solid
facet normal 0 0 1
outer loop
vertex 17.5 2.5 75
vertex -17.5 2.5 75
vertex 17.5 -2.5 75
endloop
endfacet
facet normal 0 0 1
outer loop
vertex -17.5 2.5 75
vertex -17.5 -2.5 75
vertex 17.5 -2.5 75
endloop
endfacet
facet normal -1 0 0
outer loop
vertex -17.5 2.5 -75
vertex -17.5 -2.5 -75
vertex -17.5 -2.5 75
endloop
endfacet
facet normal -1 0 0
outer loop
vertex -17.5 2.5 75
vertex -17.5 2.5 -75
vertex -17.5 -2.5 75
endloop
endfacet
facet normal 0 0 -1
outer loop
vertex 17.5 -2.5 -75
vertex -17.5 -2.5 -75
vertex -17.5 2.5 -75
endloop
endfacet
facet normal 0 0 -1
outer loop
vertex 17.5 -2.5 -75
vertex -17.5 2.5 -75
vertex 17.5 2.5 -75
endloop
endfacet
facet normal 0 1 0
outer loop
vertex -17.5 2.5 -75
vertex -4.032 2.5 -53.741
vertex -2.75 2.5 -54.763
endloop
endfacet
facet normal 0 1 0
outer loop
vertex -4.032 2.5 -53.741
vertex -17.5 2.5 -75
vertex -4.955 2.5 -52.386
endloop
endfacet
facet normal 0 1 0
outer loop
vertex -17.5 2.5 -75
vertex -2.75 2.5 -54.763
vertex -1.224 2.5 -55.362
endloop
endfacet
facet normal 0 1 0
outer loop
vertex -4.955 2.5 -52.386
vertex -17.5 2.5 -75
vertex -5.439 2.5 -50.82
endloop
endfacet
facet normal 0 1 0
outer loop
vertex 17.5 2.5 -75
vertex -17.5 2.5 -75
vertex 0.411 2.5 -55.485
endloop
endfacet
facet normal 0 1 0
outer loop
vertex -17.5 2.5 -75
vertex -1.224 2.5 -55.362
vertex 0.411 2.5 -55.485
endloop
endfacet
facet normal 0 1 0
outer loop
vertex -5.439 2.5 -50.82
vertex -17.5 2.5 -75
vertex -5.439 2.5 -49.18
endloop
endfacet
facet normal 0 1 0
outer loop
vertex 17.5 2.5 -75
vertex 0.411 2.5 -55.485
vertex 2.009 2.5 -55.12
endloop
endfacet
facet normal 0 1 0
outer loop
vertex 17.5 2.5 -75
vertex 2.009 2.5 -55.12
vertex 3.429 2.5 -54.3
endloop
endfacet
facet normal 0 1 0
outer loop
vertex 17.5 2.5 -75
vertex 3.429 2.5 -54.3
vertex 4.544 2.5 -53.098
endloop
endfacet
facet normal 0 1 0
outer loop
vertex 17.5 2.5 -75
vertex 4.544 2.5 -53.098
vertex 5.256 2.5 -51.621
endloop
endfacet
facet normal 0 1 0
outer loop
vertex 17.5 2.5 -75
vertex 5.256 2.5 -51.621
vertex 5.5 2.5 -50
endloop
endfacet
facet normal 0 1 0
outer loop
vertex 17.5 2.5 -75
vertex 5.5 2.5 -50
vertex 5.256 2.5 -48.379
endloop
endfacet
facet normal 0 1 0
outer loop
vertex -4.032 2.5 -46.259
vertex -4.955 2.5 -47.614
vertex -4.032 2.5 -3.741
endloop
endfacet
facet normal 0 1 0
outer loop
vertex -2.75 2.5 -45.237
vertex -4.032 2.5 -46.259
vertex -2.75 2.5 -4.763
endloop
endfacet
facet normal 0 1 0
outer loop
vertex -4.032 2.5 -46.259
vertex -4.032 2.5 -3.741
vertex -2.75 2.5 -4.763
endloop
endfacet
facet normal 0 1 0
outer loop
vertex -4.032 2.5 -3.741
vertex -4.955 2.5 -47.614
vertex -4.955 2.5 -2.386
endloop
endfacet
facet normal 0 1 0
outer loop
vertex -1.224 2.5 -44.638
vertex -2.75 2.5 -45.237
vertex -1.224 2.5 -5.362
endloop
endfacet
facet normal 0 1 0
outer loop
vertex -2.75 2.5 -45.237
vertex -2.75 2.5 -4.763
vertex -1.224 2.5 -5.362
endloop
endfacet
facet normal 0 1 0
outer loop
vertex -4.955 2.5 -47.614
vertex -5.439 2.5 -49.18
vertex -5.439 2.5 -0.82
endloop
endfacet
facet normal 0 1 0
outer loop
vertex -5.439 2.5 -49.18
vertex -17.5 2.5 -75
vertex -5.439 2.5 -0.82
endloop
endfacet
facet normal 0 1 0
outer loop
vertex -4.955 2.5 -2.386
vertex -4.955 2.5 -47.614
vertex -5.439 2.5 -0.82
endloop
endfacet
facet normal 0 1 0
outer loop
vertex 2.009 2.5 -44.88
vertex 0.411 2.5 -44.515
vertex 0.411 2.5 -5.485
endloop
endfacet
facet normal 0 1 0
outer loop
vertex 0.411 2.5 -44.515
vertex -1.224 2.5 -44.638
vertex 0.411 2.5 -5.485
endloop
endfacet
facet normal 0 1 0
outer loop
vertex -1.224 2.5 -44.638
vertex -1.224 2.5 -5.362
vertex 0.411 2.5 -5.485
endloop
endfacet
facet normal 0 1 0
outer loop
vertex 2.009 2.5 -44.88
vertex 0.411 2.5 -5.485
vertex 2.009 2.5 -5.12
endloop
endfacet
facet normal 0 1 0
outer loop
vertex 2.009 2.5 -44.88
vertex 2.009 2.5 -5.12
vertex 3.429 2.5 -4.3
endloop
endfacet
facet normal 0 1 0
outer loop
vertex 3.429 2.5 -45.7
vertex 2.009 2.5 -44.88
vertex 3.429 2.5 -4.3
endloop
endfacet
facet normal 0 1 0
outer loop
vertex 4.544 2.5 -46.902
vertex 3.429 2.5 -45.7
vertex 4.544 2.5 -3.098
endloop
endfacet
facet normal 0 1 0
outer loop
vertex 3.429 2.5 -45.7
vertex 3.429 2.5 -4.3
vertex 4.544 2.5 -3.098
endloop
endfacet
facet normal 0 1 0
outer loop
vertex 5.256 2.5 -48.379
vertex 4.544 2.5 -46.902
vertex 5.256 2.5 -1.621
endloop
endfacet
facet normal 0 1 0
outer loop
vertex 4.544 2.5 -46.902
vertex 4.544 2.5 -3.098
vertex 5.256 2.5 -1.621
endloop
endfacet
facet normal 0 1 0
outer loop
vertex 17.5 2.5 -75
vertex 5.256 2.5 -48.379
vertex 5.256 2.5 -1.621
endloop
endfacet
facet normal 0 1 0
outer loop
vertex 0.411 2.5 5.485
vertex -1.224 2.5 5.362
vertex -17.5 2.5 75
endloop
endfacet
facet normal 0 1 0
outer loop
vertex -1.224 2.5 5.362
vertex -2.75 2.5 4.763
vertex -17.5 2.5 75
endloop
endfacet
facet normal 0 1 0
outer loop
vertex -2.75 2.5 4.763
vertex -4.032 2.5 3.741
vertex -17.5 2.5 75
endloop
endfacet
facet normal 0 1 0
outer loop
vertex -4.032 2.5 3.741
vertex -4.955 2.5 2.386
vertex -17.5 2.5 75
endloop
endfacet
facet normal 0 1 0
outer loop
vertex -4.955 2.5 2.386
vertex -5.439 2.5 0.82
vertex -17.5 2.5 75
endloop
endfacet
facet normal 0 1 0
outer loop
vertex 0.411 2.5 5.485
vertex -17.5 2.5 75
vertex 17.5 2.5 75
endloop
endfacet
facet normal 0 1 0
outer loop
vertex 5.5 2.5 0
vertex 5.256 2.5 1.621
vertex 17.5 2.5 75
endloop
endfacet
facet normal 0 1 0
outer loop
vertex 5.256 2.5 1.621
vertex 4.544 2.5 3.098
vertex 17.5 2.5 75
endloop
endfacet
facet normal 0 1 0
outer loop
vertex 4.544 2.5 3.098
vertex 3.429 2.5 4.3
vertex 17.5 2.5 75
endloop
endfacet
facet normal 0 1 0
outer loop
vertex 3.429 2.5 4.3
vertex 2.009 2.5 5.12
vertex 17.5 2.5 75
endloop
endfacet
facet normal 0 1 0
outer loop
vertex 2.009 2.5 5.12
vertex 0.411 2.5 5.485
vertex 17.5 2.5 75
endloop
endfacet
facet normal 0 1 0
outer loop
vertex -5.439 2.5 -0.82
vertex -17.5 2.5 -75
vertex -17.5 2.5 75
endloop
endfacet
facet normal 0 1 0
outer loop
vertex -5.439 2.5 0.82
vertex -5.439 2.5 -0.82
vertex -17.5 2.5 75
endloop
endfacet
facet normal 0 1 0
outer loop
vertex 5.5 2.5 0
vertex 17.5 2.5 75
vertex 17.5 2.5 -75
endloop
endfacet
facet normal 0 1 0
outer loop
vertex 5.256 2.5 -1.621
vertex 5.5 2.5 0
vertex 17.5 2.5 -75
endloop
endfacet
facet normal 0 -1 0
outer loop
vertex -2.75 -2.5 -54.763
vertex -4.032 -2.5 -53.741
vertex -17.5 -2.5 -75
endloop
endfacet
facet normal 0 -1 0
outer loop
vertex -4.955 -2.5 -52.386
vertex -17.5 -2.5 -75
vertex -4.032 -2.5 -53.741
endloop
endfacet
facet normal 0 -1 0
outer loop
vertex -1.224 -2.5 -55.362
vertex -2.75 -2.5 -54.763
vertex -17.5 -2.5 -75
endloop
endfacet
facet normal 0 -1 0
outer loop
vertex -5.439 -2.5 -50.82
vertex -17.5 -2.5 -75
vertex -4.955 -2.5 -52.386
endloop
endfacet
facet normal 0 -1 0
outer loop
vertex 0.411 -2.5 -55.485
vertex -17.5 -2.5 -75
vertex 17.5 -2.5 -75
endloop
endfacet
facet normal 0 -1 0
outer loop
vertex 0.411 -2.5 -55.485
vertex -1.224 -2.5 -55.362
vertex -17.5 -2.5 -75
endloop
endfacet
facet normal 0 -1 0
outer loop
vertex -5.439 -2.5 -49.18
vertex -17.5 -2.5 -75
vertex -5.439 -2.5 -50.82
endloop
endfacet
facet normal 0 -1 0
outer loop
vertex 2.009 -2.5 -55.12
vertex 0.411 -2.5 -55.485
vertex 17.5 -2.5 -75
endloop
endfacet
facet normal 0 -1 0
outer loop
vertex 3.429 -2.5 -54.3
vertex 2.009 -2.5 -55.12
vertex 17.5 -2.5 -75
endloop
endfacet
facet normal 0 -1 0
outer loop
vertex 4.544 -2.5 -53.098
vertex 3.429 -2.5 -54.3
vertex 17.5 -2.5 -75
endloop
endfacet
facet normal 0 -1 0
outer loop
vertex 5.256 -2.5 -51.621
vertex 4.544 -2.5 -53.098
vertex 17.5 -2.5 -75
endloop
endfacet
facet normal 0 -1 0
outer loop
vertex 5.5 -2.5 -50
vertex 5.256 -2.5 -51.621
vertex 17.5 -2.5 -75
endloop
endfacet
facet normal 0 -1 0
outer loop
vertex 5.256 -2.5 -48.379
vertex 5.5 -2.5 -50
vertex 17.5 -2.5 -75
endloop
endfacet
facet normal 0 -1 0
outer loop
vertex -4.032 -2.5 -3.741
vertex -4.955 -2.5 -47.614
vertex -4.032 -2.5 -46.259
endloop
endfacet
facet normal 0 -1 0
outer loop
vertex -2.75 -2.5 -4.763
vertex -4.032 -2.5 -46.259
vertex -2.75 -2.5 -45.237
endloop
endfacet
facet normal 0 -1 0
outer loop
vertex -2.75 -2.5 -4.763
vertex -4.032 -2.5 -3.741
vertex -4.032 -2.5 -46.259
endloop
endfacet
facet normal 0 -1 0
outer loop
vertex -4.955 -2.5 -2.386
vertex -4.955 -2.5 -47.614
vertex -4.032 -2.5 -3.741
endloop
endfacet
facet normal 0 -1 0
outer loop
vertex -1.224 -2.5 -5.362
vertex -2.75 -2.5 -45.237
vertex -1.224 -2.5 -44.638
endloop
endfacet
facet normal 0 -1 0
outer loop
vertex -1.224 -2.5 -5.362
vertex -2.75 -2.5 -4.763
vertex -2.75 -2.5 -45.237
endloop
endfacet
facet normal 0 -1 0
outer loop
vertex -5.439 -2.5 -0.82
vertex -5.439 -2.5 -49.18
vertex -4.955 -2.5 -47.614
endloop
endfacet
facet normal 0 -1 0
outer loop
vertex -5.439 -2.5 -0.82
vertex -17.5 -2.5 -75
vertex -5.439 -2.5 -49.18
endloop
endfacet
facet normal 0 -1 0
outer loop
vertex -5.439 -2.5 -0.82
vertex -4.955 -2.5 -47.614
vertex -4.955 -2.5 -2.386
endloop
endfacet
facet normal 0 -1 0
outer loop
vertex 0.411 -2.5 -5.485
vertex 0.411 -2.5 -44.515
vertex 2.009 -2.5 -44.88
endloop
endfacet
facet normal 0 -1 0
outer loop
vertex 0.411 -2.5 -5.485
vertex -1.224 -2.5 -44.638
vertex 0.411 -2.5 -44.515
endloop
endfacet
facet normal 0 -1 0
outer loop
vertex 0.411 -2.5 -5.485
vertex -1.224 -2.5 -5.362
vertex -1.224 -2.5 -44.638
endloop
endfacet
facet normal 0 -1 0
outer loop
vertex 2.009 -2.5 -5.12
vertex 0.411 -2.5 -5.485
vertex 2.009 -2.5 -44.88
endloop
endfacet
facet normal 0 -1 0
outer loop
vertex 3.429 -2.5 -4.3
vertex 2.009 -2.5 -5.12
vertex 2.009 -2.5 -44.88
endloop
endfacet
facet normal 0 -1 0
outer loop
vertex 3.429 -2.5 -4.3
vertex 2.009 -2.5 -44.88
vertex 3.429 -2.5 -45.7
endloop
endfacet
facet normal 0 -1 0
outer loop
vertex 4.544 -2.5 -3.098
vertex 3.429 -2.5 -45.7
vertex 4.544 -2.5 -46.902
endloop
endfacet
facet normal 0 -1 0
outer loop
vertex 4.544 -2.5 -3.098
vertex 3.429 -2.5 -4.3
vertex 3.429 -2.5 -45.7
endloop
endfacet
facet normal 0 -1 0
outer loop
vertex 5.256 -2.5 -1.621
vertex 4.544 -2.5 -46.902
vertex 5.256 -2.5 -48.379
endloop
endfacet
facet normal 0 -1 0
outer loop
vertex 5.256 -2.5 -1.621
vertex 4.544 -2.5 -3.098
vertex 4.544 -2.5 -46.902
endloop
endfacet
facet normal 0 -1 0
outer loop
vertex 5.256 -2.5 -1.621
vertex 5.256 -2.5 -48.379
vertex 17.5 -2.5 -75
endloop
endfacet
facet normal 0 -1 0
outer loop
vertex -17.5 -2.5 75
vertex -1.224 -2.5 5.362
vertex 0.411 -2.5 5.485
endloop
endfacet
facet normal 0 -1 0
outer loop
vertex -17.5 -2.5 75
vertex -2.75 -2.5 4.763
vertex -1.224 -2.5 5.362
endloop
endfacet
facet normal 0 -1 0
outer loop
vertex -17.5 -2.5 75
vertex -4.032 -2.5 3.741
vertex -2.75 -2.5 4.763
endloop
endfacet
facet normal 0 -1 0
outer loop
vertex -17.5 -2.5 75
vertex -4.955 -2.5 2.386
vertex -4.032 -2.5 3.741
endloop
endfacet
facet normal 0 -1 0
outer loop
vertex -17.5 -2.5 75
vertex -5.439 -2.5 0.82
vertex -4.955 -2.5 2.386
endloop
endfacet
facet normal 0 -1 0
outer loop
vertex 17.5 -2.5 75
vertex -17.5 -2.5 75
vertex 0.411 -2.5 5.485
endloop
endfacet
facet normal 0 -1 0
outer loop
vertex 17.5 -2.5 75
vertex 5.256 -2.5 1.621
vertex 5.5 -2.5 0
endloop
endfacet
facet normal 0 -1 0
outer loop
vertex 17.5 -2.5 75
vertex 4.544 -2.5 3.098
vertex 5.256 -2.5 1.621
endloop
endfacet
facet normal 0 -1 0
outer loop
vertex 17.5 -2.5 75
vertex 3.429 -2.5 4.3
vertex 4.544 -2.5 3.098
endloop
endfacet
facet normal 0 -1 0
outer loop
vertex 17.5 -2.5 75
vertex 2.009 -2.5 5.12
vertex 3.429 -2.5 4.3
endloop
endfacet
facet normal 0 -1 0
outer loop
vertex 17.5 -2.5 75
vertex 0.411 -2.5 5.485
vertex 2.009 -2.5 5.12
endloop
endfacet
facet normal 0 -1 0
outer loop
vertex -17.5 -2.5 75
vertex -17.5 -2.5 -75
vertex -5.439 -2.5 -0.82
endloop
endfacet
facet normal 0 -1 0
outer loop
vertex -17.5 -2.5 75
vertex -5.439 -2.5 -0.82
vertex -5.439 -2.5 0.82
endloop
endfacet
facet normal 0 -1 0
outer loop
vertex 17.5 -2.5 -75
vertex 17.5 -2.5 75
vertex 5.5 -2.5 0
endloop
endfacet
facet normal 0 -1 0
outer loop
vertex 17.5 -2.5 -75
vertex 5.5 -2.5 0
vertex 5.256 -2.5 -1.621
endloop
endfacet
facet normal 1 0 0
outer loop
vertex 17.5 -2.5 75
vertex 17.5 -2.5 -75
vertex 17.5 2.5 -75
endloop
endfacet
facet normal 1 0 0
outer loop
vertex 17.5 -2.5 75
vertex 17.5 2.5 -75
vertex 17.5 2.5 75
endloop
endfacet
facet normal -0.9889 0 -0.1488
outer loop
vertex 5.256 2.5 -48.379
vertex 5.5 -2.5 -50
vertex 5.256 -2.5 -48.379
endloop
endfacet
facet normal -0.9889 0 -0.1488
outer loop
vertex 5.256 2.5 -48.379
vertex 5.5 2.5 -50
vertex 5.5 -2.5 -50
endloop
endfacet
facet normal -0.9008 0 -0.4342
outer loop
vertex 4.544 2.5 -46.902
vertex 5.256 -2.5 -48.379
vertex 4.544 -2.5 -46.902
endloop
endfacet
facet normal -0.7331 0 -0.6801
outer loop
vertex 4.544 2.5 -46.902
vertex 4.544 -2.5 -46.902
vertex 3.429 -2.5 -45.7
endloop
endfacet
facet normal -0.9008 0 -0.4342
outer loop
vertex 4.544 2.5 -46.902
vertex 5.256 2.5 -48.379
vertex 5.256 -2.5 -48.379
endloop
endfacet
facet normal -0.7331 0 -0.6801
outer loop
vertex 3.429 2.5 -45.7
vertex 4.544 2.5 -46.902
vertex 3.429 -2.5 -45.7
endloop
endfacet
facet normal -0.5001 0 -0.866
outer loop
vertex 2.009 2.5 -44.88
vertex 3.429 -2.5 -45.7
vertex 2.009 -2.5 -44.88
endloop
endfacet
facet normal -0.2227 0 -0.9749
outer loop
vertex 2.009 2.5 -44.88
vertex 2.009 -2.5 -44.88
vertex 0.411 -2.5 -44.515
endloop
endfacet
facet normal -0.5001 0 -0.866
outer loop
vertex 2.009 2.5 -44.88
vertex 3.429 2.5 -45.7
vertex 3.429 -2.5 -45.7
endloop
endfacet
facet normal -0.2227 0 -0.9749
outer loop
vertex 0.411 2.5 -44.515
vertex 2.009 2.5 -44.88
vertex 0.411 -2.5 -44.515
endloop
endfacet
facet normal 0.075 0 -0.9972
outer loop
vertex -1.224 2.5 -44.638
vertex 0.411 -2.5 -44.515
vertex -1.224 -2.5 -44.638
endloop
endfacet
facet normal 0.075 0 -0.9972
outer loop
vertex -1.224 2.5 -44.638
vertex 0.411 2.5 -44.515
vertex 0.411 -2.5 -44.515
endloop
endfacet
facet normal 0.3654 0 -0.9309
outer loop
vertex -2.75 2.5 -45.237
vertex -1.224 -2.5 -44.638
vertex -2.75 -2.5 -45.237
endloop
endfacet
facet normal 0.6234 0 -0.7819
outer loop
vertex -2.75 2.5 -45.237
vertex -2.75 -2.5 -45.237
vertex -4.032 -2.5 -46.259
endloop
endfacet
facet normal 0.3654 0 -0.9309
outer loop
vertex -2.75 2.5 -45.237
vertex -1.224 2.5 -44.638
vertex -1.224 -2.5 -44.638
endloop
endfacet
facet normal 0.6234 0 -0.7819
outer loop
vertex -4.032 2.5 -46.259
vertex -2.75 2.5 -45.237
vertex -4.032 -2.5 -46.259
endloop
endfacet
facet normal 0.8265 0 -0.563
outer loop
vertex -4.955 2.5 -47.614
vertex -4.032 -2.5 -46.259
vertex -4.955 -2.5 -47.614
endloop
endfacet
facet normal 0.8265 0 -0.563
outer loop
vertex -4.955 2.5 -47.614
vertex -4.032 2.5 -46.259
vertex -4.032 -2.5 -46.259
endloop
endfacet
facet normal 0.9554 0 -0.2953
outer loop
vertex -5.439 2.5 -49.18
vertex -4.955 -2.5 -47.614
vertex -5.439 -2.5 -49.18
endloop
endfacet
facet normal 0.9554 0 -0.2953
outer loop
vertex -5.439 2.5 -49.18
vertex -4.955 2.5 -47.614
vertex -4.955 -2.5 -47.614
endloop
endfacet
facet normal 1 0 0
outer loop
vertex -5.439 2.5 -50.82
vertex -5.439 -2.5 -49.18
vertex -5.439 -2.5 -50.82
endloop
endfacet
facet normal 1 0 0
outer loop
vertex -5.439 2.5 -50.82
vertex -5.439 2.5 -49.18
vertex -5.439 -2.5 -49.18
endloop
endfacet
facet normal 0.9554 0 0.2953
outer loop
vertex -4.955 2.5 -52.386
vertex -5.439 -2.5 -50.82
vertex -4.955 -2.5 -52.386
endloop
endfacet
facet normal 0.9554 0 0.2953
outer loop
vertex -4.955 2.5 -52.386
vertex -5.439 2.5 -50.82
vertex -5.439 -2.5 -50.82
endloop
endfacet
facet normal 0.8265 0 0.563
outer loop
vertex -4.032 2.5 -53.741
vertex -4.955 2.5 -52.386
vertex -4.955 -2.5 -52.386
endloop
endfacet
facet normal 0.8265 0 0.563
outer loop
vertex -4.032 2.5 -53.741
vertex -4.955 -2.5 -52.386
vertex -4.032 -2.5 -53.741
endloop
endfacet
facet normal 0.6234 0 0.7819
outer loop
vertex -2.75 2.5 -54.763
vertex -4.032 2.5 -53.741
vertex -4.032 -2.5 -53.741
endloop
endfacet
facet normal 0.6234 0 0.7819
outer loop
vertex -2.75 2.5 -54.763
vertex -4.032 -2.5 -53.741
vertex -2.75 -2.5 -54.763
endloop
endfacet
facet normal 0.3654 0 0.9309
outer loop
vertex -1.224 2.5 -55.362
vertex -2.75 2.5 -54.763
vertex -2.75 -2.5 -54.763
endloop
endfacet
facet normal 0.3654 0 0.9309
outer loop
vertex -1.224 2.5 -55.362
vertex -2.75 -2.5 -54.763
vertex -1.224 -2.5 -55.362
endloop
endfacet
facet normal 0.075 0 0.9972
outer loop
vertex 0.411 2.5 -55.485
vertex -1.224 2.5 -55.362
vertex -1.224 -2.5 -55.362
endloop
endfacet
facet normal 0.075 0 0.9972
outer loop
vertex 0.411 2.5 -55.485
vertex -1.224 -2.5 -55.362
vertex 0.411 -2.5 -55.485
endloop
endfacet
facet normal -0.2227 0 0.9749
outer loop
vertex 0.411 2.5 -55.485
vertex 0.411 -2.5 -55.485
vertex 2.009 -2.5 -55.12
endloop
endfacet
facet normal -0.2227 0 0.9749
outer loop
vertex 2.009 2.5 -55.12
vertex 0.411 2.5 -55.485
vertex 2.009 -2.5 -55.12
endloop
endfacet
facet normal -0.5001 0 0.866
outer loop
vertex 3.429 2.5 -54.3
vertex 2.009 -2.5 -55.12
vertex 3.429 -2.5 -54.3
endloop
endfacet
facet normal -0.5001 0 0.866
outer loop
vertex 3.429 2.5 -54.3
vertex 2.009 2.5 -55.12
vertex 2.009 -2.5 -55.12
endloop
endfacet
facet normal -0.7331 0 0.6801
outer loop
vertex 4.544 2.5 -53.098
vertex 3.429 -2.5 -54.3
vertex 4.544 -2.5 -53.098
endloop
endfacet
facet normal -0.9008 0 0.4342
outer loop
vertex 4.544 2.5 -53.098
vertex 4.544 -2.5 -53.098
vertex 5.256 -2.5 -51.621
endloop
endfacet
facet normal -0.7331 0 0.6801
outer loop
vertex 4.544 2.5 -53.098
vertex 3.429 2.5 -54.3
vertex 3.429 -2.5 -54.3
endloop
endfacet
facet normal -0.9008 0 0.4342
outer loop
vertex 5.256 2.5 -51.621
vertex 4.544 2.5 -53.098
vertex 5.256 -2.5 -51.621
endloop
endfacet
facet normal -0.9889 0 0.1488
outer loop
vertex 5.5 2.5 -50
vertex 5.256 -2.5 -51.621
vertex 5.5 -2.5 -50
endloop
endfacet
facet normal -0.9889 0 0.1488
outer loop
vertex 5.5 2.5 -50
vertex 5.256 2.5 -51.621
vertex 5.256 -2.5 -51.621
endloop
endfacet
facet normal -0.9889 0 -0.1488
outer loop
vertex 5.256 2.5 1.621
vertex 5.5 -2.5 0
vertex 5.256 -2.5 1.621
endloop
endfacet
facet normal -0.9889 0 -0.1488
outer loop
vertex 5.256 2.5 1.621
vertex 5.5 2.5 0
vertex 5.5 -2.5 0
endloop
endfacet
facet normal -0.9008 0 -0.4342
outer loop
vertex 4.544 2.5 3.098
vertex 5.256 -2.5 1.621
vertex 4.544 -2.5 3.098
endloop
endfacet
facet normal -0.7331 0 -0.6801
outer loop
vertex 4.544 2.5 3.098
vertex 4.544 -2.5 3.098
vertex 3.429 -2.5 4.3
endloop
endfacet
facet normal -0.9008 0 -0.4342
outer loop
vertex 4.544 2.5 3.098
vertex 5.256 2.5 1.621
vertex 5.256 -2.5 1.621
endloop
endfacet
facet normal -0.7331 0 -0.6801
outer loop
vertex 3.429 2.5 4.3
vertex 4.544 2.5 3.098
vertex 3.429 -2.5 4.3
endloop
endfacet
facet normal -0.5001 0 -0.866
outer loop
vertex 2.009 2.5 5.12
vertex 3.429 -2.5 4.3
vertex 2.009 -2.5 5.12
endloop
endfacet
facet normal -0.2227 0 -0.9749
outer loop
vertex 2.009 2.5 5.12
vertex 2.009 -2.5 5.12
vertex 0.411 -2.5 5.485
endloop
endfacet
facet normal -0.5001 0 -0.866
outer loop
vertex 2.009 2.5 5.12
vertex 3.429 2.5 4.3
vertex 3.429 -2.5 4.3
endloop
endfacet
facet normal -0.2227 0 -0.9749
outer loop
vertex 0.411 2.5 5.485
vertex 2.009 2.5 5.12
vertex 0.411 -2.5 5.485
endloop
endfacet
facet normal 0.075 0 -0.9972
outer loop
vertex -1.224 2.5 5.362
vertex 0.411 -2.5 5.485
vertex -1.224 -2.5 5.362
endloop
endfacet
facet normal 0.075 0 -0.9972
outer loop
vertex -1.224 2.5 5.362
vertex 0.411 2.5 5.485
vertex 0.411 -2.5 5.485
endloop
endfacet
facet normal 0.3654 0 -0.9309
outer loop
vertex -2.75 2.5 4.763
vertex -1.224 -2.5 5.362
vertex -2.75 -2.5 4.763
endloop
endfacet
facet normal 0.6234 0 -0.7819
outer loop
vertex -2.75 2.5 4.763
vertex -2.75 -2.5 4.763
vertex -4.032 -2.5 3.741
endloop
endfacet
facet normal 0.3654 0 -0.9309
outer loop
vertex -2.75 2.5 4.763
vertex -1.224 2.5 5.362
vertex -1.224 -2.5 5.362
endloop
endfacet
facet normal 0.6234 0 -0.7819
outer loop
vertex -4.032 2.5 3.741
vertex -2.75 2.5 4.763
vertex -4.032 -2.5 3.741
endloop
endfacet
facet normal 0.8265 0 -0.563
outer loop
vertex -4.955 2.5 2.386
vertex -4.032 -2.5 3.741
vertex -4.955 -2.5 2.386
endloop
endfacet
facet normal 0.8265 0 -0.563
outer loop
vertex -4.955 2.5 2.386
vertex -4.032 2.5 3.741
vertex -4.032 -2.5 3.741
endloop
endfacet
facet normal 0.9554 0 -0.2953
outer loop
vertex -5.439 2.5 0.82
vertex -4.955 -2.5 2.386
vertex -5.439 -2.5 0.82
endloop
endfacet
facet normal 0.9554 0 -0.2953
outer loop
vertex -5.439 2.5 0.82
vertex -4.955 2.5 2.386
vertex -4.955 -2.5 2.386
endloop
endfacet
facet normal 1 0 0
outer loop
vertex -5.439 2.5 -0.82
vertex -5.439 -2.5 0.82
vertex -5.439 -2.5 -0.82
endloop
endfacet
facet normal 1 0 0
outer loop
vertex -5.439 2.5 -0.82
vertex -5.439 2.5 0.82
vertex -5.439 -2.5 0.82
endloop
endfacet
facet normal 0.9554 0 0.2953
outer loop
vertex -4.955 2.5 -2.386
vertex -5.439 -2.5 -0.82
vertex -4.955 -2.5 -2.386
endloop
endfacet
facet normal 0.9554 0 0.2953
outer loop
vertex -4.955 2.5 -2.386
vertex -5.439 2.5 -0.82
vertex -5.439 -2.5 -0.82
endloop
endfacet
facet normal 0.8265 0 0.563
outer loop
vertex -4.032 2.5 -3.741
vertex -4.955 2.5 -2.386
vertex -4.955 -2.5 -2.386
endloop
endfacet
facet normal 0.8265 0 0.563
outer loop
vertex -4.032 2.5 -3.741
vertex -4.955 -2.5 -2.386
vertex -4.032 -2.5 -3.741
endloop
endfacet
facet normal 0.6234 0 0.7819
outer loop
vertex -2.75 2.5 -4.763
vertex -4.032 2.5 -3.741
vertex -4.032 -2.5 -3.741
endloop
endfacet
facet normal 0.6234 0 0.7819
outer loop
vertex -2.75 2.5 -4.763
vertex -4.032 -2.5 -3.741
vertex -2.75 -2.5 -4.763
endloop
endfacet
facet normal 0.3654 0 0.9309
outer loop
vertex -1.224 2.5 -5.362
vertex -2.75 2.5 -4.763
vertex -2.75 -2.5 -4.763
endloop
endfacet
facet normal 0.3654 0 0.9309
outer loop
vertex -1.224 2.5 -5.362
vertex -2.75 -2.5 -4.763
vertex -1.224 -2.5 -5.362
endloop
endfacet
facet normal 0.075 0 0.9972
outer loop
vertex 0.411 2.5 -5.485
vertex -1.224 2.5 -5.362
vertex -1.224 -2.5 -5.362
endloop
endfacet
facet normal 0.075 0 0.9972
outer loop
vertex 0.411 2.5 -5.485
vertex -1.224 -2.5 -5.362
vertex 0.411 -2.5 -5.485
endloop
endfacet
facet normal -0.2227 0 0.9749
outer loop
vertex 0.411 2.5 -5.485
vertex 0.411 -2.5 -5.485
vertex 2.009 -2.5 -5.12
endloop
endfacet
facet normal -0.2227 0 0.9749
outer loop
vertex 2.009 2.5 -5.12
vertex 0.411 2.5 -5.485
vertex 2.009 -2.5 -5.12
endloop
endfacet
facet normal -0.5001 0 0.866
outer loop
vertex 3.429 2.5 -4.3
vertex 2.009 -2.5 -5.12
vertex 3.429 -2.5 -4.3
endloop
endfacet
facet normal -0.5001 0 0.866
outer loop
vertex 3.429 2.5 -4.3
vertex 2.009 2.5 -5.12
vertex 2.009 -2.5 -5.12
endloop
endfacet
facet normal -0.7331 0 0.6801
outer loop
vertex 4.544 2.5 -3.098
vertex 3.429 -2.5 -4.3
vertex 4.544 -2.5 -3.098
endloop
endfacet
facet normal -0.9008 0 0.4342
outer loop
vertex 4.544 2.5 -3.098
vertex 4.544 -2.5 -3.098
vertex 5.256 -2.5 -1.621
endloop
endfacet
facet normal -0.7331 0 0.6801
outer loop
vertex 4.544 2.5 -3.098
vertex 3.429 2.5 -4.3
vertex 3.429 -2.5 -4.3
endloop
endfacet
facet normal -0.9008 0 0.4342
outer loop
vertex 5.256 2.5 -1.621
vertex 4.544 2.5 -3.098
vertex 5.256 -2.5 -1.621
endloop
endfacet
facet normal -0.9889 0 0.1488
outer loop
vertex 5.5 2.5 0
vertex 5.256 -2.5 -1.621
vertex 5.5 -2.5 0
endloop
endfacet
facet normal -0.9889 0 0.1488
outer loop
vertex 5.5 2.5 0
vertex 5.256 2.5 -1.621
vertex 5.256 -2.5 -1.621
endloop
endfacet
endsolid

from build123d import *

# Parameters (mm, degrees)
F0_W     = 35
F0_H     = 150
F0_R     = 5.5
F1_DEPTH = 2.5


with BuildPart() as f1:
    # F0 (on Front) → F1 (new body, symmetric)
    with BuildSketch(Plane.XZ):
        Rectangle(F0_W, F0_H)
        with Locations((0, -50)):
            Circle(F0_R, mode=Mode.SUBTRACT)
        Circle(F0_R, mode=Mode.SUBTRACT)
    extrude(amount=F1_DEPTH, both=True)


solid = f1.part
